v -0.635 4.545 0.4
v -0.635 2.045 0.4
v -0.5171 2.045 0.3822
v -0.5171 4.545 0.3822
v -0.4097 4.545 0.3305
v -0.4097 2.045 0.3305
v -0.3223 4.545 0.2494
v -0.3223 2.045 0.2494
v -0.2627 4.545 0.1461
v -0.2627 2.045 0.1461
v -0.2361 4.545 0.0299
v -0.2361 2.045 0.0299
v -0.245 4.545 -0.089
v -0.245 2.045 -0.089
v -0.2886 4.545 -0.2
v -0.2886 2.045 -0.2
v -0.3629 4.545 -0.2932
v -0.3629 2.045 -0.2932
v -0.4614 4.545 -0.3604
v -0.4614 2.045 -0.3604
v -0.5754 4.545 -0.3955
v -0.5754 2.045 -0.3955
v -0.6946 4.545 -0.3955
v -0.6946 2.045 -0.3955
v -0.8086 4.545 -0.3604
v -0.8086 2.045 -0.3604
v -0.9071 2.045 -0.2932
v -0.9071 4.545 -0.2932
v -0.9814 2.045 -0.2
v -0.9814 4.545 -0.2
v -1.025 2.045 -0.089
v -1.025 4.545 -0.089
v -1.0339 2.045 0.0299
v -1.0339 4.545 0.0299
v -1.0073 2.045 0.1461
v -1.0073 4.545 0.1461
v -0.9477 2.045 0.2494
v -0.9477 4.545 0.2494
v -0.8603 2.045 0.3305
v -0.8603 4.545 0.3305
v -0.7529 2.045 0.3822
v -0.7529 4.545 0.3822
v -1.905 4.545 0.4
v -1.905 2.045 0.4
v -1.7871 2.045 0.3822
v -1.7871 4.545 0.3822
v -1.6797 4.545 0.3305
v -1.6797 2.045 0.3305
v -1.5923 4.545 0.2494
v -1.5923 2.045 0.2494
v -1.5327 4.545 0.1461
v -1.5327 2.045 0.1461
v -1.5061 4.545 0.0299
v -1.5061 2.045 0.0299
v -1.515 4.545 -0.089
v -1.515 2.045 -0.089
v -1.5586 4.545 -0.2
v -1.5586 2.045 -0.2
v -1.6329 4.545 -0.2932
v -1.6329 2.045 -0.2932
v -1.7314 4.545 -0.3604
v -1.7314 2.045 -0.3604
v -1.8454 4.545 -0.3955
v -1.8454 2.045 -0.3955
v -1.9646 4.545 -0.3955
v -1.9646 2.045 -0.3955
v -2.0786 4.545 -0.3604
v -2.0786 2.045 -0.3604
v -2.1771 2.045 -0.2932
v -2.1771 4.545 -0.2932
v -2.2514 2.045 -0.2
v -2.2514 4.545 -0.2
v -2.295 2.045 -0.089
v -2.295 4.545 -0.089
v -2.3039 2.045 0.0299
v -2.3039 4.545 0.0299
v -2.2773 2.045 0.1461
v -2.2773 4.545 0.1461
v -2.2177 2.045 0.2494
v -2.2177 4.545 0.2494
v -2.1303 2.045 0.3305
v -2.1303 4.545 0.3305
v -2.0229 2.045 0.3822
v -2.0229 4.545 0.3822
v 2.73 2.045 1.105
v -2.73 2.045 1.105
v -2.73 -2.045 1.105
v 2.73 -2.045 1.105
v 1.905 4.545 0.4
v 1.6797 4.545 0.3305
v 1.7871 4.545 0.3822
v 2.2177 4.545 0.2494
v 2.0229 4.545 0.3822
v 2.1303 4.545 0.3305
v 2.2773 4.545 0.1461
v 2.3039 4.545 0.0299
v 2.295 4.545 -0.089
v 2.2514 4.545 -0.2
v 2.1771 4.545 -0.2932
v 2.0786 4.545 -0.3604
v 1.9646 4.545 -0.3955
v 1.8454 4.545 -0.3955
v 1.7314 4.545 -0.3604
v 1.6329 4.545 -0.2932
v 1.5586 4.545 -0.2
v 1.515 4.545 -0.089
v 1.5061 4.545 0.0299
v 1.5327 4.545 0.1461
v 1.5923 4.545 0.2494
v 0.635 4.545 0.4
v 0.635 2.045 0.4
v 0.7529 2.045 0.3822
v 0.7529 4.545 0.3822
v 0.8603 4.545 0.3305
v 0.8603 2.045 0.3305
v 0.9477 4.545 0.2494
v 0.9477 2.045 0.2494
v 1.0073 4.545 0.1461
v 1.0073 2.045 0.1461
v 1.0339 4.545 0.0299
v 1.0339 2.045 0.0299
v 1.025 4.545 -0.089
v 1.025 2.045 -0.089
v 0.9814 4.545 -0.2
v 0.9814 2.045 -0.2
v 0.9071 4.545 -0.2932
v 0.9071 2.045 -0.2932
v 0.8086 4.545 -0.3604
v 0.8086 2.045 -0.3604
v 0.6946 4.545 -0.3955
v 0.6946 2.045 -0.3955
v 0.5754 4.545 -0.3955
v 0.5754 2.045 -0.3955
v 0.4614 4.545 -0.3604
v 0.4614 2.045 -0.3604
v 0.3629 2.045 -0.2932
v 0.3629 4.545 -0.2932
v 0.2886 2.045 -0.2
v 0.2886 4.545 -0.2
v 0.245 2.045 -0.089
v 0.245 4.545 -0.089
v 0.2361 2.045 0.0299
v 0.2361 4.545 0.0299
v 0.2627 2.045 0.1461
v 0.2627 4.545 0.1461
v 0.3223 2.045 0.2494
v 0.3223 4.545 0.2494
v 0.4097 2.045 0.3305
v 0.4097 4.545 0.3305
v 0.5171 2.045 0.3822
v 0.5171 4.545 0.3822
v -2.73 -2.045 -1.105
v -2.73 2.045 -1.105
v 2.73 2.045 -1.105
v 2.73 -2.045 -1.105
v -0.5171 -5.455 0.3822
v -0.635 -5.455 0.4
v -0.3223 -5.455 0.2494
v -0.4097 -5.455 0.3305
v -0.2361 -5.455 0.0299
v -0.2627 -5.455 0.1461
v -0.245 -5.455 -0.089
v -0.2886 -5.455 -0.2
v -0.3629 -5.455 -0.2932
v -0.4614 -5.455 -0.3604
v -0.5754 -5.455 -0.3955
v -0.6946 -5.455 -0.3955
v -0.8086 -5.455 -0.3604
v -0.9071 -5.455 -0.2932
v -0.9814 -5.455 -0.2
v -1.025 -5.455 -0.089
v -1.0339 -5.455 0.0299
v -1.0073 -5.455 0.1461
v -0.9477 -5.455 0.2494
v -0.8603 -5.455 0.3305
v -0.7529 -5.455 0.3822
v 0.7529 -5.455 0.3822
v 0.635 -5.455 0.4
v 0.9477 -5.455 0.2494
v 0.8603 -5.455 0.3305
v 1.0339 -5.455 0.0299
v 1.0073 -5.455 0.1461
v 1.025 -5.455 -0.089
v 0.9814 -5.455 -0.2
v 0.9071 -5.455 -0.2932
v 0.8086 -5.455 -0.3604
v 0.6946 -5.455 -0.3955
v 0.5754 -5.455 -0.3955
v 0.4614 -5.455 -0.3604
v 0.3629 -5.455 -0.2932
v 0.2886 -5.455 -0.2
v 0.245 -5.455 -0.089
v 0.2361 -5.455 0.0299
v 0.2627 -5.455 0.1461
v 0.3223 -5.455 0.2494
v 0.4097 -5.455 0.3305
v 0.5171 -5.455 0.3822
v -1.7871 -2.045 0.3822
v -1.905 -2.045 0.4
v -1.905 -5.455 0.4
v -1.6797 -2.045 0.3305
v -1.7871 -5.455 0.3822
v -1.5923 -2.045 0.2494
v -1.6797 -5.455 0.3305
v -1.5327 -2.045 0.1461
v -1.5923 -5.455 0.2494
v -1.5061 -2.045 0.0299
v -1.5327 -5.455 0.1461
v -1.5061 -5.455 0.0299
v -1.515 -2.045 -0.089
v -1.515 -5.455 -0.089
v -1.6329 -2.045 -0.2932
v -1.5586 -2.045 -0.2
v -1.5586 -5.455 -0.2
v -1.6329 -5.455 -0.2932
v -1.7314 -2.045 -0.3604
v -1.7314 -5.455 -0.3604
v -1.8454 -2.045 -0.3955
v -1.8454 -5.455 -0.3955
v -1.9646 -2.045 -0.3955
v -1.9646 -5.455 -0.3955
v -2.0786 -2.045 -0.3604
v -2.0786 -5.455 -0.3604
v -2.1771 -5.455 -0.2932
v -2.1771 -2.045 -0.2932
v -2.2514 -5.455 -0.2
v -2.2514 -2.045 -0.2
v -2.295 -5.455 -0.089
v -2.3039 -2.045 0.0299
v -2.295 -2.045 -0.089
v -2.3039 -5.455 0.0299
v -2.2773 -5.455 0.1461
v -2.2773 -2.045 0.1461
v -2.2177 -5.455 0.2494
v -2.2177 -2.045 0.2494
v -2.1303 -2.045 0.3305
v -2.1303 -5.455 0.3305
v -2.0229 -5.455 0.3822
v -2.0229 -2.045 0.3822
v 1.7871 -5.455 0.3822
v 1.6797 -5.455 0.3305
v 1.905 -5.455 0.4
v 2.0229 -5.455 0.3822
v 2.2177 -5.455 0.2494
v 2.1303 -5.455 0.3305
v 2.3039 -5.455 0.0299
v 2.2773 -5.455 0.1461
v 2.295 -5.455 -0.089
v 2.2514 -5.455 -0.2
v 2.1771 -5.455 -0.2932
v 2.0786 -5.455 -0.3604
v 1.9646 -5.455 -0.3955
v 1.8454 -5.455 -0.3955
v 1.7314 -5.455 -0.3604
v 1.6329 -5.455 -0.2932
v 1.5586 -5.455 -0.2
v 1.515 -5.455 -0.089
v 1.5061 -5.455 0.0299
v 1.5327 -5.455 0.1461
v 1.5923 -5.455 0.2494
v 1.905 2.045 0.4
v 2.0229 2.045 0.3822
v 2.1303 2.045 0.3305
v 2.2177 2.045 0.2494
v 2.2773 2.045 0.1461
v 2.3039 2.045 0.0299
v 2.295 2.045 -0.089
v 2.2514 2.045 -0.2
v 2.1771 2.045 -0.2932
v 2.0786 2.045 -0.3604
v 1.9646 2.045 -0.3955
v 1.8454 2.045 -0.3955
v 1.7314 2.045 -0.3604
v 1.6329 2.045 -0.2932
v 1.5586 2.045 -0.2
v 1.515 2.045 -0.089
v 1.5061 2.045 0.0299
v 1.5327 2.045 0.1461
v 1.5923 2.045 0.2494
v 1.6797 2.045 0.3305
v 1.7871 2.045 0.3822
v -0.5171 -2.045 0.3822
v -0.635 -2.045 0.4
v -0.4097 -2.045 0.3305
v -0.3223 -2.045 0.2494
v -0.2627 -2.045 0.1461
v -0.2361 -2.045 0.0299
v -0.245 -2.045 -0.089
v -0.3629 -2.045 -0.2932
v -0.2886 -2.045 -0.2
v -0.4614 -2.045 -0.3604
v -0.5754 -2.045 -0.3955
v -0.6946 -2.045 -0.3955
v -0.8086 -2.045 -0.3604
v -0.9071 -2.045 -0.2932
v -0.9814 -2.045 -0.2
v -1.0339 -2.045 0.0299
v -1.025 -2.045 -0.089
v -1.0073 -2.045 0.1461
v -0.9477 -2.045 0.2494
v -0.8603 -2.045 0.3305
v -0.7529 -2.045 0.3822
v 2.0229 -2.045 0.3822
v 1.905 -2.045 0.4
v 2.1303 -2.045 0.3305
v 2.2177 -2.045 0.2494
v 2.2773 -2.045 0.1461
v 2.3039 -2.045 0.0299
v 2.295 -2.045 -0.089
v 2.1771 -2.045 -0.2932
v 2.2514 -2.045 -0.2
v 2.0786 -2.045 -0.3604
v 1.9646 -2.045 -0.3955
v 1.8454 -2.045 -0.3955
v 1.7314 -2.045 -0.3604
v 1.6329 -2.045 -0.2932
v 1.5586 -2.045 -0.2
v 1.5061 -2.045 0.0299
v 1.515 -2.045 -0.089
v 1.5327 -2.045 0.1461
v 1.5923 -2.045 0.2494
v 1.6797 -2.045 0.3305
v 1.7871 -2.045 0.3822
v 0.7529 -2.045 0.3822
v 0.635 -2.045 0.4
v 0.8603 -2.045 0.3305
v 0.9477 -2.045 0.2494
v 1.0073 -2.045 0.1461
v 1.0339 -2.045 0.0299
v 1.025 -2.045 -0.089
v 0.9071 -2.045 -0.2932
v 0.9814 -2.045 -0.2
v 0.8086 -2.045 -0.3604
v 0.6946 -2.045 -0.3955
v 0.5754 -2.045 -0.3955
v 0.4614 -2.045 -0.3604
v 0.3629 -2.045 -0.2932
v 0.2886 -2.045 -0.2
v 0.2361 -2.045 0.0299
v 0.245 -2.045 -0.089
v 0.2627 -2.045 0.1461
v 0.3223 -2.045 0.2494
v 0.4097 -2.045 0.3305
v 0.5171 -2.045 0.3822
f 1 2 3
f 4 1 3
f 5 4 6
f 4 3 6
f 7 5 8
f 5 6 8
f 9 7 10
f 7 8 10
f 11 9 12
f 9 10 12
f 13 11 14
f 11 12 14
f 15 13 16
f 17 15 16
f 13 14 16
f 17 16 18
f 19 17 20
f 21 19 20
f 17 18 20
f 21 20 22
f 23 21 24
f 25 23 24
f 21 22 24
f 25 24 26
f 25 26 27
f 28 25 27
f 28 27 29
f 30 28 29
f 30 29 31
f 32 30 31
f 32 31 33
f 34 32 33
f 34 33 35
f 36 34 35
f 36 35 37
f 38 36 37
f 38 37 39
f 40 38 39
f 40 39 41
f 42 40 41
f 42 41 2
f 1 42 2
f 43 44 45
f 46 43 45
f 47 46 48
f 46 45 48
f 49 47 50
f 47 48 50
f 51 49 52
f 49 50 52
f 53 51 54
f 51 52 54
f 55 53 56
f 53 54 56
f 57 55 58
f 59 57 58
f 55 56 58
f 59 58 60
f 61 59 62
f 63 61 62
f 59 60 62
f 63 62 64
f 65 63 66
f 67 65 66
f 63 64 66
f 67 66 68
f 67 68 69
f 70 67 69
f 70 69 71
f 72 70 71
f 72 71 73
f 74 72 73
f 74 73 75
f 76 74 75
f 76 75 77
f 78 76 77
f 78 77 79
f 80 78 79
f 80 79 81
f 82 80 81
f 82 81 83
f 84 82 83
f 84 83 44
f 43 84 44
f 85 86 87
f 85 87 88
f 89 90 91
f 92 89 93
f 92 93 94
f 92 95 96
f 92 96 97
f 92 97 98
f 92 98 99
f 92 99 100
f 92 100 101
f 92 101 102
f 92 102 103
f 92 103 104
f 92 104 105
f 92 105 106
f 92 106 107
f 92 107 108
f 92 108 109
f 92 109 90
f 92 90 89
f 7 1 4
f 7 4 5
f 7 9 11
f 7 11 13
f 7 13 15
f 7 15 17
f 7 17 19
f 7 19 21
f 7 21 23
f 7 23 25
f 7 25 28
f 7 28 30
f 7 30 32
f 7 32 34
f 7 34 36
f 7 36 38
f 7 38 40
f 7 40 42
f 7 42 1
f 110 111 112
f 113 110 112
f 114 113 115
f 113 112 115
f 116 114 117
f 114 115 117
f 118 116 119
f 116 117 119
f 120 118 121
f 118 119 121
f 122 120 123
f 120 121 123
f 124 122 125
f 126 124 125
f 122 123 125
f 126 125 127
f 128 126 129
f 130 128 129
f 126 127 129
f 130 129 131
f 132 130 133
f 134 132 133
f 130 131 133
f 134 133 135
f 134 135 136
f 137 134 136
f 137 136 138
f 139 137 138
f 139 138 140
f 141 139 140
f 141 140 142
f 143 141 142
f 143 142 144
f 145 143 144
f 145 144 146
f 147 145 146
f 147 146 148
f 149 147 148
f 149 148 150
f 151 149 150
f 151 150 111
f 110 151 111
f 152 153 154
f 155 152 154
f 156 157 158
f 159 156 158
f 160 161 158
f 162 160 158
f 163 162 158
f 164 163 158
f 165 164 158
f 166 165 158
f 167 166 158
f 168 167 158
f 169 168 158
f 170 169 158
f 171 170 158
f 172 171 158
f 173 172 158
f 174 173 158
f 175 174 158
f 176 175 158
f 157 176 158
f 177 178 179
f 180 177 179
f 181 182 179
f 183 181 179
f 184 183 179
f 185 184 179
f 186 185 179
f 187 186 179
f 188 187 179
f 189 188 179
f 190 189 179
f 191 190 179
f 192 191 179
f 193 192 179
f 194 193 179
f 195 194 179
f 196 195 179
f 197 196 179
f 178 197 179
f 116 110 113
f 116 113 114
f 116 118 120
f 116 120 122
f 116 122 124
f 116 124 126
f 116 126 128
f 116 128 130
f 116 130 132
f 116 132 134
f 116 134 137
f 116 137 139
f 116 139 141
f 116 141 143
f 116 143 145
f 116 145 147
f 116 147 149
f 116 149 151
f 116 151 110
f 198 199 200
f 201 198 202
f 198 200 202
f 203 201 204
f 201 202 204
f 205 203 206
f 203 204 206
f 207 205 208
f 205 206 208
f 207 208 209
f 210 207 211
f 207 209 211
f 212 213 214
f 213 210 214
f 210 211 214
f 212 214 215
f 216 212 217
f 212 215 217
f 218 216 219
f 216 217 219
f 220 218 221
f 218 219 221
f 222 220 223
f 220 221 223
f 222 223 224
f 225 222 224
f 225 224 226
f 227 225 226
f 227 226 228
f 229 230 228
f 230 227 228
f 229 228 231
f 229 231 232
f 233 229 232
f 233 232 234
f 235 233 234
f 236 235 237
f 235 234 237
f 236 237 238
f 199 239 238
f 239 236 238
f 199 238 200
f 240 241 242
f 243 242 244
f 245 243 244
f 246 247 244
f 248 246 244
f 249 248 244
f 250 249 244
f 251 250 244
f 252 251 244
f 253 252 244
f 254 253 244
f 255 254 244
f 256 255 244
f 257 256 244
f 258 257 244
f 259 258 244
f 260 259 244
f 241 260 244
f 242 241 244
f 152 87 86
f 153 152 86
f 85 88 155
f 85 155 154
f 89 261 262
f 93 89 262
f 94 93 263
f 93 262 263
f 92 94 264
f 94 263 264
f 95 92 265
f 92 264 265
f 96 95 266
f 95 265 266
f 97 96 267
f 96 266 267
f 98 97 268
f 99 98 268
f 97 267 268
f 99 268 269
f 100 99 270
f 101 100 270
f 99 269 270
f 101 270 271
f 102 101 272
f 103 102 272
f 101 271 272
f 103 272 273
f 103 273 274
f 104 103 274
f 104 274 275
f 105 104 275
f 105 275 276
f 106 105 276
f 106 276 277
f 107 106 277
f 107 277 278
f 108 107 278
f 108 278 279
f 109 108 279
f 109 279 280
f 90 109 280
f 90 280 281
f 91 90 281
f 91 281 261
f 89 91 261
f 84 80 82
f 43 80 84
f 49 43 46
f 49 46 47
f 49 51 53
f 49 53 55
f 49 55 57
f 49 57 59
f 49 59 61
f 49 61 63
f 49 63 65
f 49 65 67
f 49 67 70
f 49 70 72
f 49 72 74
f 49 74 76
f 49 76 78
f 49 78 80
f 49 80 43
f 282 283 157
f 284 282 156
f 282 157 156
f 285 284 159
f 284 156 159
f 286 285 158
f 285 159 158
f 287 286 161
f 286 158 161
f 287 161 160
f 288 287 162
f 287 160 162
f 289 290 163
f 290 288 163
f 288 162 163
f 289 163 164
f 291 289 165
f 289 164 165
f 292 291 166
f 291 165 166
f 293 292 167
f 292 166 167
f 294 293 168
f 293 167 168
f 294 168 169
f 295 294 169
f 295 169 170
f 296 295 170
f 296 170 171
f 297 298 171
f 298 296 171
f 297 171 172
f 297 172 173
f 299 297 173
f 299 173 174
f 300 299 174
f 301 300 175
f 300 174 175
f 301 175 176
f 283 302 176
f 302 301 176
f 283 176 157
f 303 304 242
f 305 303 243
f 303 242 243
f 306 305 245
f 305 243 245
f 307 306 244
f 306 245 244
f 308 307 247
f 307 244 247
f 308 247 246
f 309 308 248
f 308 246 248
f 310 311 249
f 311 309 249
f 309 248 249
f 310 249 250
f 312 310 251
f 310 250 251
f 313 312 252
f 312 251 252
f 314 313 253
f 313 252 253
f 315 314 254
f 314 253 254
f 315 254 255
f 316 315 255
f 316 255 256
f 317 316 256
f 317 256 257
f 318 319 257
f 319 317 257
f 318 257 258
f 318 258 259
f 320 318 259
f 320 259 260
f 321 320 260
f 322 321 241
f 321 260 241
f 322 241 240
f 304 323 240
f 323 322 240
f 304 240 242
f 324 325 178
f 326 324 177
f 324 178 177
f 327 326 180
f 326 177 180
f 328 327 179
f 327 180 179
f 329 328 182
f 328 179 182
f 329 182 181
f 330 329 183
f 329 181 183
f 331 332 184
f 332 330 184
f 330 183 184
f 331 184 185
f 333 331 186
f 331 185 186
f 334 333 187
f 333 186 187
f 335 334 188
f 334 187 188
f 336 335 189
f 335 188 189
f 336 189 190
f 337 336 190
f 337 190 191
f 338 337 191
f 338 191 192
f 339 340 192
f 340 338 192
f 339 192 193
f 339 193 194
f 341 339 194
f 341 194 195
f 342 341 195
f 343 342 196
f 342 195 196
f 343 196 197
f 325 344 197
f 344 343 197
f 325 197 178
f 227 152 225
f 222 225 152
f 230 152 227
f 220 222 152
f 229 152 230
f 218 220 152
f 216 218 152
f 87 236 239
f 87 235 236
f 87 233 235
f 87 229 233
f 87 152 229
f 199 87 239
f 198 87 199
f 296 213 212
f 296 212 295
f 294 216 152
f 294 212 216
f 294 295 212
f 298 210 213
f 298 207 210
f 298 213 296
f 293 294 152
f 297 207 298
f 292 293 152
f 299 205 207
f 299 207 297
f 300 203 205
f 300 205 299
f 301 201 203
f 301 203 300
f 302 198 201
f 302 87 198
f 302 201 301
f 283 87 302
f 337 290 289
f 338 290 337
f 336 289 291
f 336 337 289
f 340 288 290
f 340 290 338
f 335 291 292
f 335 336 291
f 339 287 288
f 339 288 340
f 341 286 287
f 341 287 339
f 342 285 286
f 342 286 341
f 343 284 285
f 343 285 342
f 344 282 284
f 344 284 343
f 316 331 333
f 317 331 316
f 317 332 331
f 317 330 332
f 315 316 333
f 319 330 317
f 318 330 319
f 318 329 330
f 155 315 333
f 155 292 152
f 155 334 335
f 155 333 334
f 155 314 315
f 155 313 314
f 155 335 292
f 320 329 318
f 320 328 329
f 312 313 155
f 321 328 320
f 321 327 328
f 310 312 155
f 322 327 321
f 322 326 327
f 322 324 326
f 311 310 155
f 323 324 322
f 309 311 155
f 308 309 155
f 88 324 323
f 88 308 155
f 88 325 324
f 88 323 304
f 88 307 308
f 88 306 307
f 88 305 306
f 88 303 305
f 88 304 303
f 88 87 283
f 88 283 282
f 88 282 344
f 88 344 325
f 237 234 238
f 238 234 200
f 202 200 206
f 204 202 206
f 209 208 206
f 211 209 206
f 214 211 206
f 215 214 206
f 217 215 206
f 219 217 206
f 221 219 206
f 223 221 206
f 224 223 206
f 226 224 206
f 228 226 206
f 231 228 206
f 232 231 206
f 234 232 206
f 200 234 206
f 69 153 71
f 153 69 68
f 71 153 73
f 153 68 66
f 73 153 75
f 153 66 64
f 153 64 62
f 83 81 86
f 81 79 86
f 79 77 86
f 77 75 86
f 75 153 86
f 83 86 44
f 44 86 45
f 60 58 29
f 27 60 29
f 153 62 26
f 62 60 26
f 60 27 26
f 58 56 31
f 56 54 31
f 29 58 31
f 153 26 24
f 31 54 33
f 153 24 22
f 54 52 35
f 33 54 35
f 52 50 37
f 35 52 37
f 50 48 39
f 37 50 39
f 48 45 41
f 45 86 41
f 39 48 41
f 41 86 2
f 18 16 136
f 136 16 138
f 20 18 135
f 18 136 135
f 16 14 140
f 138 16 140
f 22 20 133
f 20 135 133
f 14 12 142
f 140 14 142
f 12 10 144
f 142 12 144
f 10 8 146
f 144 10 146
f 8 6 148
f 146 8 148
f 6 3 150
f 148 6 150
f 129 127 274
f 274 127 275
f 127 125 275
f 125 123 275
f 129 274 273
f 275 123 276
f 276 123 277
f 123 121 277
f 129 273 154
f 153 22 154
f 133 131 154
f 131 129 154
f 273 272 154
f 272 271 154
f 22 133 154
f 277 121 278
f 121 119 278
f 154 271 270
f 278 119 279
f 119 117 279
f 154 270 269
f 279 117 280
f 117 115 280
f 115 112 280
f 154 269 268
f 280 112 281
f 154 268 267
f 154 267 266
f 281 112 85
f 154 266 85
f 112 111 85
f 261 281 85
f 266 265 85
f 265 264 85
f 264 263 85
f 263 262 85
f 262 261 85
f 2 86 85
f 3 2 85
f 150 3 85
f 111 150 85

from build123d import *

# Parameters (mm, degrees)
SKETCH1_W           = 5.46
SKETCH1_H           = 4.09
BOSS_EXTRUDE1_DEPTH = 1.105
BOSS_EXTRUDE2_START = -7.5
SKETCH2_R           = 0.4
BOSS_EXTRUDE2_DEPTH = 10


with BuildPart() as part:
    # Sketch1 → Boss-Extrude1 (new, symmetric)
    with BuildSketch(Plane.XY):
        Rectangle(SKETCH1_W, SKETCH1_H)
    extrude(amount=BOSS_EXTRUDE1_DEPTH, both=True)

    # Sketch2 → Boss-Extrude2 (add)
    with BuildSketch(Plane(origin=(0, 2.045, 0), x_dir=(1, 0, 0), z_dir=(0, 1, 0)).offset(BOSS_EXTRUDE2_START)):
        with Locations(Location((-1.905, 0, 0), (0, 0, 270))):
            Circle(SKETCH2_R)
        with Locations(Location((-0.635, 0, 0), (0, 0, 270))):
            Circle(SKETCH2_R)
        with Locations(Location((0.635, 0, 0), (0, 0, 270))):
            Circle(SKETCH2_R)
        with Locations(Location((1.905, 0, 0), (0, 0, 270))):
            Circle(SKETCH2_R)
    extrude(amount=BOSS_EXTRUDE2_DEPTH)


solid = part.part
